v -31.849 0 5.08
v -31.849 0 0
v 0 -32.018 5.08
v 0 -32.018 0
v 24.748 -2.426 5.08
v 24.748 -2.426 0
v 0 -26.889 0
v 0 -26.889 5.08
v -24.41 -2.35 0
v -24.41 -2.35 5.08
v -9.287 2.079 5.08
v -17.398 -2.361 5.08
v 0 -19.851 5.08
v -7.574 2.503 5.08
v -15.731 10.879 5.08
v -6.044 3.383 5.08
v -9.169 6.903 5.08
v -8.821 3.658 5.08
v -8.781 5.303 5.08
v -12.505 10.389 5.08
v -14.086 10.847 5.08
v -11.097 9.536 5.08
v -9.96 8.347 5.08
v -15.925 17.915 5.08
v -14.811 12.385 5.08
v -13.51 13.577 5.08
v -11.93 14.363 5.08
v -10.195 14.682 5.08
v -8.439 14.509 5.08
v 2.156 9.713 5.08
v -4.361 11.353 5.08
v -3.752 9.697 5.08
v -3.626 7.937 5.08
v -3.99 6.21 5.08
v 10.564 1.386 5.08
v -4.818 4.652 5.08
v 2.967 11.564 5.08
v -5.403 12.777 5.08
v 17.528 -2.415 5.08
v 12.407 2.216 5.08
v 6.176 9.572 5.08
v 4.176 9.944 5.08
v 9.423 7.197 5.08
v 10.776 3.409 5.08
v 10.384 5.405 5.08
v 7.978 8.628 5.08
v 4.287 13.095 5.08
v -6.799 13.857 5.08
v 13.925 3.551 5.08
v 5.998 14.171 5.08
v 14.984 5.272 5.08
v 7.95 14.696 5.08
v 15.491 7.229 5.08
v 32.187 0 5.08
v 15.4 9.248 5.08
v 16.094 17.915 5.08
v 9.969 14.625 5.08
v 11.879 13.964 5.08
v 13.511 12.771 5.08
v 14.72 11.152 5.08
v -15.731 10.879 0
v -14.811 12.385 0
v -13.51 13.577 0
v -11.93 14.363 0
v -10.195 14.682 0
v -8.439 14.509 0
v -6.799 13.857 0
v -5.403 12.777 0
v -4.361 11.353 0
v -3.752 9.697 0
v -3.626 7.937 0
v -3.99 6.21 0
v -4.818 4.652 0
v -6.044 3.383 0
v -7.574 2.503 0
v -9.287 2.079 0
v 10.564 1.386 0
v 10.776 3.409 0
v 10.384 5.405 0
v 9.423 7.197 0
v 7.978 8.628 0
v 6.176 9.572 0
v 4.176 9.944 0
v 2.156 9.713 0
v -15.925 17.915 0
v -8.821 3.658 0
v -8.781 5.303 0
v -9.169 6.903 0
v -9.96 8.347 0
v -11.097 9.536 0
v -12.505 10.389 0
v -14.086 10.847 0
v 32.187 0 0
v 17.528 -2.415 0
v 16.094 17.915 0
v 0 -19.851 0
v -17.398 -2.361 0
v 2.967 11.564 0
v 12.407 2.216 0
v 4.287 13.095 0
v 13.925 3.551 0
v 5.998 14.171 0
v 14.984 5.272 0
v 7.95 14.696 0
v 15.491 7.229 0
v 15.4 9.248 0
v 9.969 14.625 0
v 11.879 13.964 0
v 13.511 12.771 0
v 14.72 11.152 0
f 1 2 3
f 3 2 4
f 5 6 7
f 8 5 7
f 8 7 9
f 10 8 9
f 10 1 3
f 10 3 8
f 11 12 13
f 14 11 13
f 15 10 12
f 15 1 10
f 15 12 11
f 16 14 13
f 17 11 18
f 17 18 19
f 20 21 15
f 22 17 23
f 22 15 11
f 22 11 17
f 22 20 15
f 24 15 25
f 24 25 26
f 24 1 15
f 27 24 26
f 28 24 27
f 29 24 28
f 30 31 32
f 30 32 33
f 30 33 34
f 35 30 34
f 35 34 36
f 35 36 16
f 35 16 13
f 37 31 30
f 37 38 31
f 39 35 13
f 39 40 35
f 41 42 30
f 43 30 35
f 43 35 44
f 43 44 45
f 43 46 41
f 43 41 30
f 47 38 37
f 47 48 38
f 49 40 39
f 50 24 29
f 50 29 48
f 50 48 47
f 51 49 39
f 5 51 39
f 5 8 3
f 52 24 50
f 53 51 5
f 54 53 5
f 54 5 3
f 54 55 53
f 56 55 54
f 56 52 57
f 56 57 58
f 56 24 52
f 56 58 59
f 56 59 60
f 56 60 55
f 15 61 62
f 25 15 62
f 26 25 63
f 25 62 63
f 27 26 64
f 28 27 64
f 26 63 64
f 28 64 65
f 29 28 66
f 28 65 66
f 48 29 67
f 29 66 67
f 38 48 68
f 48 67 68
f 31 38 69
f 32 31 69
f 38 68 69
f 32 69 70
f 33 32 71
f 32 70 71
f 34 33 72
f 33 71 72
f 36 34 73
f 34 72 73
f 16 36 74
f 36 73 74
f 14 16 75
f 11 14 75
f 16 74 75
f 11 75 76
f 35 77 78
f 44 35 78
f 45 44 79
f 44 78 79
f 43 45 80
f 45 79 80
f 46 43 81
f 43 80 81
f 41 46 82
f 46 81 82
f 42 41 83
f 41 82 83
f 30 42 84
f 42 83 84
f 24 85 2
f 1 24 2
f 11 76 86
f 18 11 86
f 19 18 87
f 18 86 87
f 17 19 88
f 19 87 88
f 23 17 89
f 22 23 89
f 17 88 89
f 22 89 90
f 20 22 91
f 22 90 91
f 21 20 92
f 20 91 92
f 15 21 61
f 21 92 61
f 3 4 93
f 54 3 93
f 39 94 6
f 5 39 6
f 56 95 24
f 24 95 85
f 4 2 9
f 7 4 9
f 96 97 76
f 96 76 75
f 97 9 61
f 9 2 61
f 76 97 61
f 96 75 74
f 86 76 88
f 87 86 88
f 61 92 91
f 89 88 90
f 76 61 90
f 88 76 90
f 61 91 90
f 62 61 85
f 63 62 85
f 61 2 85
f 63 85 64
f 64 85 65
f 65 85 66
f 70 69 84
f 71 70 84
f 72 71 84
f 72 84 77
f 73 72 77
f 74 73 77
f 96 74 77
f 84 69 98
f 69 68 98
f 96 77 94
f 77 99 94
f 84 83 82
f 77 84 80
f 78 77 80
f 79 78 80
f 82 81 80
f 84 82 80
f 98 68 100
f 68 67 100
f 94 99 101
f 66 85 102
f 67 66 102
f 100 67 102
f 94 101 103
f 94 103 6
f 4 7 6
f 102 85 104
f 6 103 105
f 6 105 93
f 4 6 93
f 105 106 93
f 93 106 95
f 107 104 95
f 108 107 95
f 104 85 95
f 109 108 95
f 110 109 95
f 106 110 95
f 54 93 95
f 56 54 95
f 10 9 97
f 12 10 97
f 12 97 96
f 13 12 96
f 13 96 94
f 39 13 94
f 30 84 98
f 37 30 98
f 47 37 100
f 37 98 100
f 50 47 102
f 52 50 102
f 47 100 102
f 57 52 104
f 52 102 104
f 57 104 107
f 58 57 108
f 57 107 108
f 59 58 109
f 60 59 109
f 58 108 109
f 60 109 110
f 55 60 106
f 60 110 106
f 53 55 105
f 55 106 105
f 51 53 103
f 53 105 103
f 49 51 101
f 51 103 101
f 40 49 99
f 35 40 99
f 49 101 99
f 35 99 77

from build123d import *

# Parameters (mm, degrees)
F1_DEPTH = 5.08


with BuildPart() as f1:
    # F0 (on Top) → F1 (new body)
    with BuildSketch(Plane.XY):
        Polygon((16.09368, 17.915163), (-15.924582, 17.915163), (-31.849165, 0), (0, -32.017816), (32.18736, 0), align=None)
        Polygon((0, -26.889354), (-24.409898, -2.350199), (-17.397631, -2.360984), (0, -19.850741), (17.528368, -2.414702), (24.747919, -2.425806), align=None, mode=Mode.SUBTRACT)
        with BuildLine():
            ThreePointArc((-15.731339, 10.879274), (-4.832174, 12.101478), (-9.286881, 2.079444))
            ThreePointArc((-9.286881, 2.079444), (-9.959517, 8.346525), (-15.731339, 10.879274))
        make_face(mode=Mode.SUBTRACT)
        with BuildLine():
            ThreePointArc((2.155719, 9.712794), (13.510836, 12.771188), (10.564446, 1.386495))
            ThreePointArc((10.564446, 1.386495), (8.75362, 7.966877), (2.155719, 9.712794))
        make_face(mode=Mode.SUBTRACT)
    extrude(amount=F1_DEPTH)


solid = f1.part
